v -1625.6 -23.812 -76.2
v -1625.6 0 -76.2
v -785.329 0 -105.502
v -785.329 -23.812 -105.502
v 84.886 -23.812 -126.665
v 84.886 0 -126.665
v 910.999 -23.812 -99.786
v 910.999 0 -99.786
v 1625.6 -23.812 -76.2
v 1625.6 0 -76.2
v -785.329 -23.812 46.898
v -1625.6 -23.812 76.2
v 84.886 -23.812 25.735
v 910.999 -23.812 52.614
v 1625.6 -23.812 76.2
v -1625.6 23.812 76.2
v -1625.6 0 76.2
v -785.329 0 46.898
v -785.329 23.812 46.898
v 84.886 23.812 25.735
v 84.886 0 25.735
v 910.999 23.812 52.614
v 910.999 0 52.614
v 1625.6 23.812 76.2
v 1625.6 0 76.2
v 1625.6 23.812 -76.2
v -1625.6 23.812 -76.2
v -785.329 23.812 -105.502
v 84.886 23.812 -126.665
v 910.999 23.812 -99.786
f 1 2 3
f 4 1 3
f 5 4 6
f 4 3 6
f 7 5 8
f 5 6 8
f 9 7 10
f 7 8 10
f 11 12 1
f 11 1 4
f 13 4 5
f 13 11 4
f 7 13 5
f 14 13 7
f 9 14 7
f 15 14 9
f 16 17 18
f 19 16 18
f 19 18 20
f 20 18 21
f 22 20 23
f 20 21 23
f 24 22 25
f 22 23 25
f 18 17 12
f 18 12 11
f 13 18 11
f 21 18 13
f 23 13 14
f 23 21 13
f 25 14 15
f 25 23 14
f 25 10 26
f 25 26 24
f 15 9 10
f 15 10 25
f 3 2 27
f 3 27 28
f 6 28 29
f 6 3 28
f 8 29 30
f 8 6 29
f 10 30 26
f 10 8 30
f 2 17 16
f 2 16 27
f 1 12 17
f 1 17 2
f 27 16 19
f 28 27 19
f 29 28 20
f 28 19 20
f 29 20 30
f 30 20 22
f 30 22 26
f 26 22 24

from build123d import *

# Parameters (mm, degrees)
F2_DEPTH = 23.8125


# Not quite as in the source:
# - a variable given as a bare number and used for a length is read in inches; the dataset says mm whatever the document's units were


with BuildPart() as f2:
    # F1 (on Front) → F2 (new body, symmetric)
    with BuildSketch(Plane.XZ):
        with BuildLine():
            Line((-1625.6, 76.2), (-1625.6, -76.2))
            add(Edge.make_bspline(
                [(-1625.6, -76.2), (-1188.0511561093, -76.2), (0, -177.8), (1188.0511561093, -76.2), (1625.6, -76.2)],
                knots=[0, 0, 0, 0, 0.5, 1, 1, 1, 1], degree=3))
            Line((1625.6, -76.2), (1625.6, 76.2))
            add(Edge.make_bspline(
                [(-1625.6, 76.2), (-1188.0511561093, 76.2), (0, -25.4), (1188.0511561093, 76.2), (1625.6, 76.2)],
                knots=[0, 0, 0, 0, 0.5, 1, 1, 1, 1], degree=3))
        make_face()
    extrude(amount=F2_DEPTH, both=True)


solid = f2.part
